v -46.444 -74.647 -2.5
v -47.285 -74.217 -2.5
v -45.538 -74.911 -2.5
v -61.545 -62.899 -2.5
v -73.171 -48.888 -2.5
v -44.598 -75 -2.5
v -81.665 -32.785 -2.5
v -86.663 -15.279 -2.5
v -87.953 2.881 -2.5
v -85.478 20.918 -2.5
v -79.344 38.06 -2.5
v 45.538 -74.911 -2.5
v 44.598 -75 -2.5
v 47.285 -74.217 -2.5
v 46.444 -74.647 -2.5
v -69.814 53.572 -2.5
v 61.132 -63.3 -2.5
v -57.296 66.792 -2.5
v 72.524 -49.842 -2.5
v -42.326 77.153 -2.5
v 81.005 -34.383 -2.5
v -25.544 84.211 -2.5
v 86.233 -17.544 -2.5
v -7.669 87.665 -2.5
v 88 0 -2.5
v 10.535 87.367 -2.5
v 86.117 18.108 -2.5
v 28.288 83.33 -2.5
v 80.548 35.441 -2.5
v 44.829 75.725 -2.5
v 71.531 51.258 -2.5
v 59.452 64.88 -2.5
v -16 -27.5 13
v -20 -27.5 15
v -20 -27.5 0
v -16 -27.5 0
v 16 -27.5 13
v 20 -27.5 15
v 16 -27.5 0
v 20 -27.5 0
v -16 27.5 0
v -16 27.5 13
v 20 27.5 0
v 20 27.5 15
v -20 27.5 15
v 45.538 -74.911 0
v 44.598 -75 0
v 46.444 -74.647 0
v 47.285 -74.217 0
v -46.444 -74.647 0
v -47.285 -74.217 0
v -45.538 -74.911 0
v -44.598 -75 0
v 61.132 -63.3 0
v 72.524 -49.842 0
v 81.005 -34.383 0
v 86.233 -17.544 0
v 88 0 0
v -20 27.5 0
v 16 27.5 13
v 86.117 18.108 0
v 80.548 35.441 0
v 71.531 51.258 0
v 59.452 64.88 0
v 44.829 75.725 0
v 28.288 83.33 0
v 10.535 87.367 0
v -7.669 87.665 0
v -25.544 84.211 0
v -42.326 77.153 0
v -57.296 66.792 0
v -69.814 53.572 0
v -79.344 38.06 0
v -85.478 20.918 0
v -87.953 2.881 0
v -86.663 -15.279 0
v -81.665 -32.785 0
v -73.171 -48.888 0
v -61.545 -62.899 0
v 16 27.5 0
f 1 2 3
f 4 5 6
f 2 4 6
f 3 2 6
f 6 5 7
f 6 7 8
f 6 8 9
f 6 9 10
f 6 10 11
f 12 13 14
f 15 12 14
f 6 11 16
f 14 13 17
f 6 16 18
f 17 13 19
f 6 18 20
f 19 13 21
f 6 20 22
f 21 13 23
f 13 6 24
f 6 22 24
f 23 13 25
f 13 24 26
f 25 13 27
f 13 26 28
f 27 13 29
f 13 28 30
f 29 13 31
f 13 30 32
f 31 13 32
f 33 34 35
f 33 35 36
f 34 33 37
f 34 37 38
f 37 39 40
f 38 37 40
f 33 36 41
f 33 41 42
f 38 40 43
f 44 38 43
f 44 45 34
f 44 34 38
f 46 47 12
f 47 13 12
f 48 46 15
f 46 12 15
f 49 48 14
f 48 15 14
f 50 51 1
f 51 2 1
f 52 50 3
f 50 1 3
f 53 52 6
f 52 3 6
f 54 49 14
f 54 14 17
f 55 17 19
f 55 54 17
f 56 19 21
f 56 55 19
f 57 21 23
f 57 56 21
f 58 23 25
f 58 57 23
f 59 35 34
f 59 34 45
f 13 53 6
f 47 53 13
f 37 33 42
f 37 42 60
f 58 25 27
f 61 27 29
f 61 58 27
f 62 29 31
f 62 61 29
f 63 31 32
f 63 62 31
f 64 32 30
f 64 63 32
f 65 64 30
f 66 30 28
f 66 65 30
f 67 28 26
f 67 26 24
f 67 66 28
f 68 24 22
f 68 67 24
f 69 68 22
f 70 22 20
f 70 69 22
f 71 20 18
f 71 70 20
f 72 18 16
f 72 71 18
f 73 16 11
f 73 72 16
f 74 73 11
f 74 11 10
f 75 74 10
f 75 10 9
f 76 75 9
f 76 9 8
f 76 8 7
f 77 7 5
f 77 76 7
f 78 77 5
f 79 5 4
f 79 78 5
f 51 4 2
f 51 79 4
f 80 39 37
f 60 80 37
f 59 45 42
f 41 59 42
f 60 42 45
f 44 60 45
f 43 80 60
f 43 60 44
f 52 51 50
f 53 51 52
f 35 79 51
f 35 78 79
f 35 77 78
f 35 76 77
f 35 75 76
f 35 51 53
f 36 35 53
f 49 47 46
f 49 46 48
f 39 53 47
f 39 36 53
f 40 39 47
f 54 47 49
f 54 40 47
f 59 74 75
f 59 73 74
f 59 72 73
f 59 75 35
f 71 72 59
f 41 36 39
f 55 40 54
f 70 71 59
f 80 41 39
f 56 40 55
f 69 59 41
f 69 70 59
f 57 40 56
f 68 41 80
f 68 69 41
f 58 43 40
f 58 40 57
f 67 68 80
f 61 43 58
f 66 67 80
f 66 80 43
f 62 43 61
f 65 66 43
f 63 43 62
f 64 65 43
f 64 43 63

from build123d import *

# Parameters (mm, degrees)
BOSS_EXTRUDE1_DEPTH = 2.5
SKETCH2_W           = 40
SKETCH2_H           = 55
BOSS_EXTRUDE2_DEPTH = 15
SKETCH3_W           = 32
SKETCH3_H           = 13
CUT_EXTRUDE1_DEPTH  = 146.976881731
FILLET1_R           = 5


with BuildPart() as part:
    # Sketch1 → Boss-Extrude1 (new body)
    with BuildSketch(Plane.XY):
        with BuildLine():
            ThreePointArc((88, 0), (-42.971685161, 76.794754212), (-46.032597146, -75))
            Line((-46.032597146, -75), (46.032597146, -75))
            ThreePointArc((46.032597146, -75), (76.794754212, -42.971685161), (88, 0))
        make_face()
    extrude(amount=-BOSS_EXTRUDE1_DEPTH)

    # Sketch2 → Boss-Extrude2 (add)
    with BuildSketch(Plane.XY):
        Rectangle(SKETCH2_W, SKETCH2_H)
    extrude(amount=BOSS_EXTRUDE2_DEPTH)

    # Sketch3 → Cut-Extrude1 (cut, through all)
    with BuildSketch(Plane.XZ.offset(27.5)):
        with Locations((0, 6.5)):
            Rectangle(SKETCH3_W, SKETCH3_H)
    extrude(amount=-CUT_EXTRUDE1_DEPTH, mode=Mode.SUBTRACT)

    # Fillet1
    fillet1_edges = [part.edges().sort_by_distance(p)[0] for p in [
        (-46.032597146, -75, -1.25),
        (46.032597146, -75, -1.25),
    ]]
    fillet(fillet1_edges, radius=FILLET1_R)


solid = part.part
